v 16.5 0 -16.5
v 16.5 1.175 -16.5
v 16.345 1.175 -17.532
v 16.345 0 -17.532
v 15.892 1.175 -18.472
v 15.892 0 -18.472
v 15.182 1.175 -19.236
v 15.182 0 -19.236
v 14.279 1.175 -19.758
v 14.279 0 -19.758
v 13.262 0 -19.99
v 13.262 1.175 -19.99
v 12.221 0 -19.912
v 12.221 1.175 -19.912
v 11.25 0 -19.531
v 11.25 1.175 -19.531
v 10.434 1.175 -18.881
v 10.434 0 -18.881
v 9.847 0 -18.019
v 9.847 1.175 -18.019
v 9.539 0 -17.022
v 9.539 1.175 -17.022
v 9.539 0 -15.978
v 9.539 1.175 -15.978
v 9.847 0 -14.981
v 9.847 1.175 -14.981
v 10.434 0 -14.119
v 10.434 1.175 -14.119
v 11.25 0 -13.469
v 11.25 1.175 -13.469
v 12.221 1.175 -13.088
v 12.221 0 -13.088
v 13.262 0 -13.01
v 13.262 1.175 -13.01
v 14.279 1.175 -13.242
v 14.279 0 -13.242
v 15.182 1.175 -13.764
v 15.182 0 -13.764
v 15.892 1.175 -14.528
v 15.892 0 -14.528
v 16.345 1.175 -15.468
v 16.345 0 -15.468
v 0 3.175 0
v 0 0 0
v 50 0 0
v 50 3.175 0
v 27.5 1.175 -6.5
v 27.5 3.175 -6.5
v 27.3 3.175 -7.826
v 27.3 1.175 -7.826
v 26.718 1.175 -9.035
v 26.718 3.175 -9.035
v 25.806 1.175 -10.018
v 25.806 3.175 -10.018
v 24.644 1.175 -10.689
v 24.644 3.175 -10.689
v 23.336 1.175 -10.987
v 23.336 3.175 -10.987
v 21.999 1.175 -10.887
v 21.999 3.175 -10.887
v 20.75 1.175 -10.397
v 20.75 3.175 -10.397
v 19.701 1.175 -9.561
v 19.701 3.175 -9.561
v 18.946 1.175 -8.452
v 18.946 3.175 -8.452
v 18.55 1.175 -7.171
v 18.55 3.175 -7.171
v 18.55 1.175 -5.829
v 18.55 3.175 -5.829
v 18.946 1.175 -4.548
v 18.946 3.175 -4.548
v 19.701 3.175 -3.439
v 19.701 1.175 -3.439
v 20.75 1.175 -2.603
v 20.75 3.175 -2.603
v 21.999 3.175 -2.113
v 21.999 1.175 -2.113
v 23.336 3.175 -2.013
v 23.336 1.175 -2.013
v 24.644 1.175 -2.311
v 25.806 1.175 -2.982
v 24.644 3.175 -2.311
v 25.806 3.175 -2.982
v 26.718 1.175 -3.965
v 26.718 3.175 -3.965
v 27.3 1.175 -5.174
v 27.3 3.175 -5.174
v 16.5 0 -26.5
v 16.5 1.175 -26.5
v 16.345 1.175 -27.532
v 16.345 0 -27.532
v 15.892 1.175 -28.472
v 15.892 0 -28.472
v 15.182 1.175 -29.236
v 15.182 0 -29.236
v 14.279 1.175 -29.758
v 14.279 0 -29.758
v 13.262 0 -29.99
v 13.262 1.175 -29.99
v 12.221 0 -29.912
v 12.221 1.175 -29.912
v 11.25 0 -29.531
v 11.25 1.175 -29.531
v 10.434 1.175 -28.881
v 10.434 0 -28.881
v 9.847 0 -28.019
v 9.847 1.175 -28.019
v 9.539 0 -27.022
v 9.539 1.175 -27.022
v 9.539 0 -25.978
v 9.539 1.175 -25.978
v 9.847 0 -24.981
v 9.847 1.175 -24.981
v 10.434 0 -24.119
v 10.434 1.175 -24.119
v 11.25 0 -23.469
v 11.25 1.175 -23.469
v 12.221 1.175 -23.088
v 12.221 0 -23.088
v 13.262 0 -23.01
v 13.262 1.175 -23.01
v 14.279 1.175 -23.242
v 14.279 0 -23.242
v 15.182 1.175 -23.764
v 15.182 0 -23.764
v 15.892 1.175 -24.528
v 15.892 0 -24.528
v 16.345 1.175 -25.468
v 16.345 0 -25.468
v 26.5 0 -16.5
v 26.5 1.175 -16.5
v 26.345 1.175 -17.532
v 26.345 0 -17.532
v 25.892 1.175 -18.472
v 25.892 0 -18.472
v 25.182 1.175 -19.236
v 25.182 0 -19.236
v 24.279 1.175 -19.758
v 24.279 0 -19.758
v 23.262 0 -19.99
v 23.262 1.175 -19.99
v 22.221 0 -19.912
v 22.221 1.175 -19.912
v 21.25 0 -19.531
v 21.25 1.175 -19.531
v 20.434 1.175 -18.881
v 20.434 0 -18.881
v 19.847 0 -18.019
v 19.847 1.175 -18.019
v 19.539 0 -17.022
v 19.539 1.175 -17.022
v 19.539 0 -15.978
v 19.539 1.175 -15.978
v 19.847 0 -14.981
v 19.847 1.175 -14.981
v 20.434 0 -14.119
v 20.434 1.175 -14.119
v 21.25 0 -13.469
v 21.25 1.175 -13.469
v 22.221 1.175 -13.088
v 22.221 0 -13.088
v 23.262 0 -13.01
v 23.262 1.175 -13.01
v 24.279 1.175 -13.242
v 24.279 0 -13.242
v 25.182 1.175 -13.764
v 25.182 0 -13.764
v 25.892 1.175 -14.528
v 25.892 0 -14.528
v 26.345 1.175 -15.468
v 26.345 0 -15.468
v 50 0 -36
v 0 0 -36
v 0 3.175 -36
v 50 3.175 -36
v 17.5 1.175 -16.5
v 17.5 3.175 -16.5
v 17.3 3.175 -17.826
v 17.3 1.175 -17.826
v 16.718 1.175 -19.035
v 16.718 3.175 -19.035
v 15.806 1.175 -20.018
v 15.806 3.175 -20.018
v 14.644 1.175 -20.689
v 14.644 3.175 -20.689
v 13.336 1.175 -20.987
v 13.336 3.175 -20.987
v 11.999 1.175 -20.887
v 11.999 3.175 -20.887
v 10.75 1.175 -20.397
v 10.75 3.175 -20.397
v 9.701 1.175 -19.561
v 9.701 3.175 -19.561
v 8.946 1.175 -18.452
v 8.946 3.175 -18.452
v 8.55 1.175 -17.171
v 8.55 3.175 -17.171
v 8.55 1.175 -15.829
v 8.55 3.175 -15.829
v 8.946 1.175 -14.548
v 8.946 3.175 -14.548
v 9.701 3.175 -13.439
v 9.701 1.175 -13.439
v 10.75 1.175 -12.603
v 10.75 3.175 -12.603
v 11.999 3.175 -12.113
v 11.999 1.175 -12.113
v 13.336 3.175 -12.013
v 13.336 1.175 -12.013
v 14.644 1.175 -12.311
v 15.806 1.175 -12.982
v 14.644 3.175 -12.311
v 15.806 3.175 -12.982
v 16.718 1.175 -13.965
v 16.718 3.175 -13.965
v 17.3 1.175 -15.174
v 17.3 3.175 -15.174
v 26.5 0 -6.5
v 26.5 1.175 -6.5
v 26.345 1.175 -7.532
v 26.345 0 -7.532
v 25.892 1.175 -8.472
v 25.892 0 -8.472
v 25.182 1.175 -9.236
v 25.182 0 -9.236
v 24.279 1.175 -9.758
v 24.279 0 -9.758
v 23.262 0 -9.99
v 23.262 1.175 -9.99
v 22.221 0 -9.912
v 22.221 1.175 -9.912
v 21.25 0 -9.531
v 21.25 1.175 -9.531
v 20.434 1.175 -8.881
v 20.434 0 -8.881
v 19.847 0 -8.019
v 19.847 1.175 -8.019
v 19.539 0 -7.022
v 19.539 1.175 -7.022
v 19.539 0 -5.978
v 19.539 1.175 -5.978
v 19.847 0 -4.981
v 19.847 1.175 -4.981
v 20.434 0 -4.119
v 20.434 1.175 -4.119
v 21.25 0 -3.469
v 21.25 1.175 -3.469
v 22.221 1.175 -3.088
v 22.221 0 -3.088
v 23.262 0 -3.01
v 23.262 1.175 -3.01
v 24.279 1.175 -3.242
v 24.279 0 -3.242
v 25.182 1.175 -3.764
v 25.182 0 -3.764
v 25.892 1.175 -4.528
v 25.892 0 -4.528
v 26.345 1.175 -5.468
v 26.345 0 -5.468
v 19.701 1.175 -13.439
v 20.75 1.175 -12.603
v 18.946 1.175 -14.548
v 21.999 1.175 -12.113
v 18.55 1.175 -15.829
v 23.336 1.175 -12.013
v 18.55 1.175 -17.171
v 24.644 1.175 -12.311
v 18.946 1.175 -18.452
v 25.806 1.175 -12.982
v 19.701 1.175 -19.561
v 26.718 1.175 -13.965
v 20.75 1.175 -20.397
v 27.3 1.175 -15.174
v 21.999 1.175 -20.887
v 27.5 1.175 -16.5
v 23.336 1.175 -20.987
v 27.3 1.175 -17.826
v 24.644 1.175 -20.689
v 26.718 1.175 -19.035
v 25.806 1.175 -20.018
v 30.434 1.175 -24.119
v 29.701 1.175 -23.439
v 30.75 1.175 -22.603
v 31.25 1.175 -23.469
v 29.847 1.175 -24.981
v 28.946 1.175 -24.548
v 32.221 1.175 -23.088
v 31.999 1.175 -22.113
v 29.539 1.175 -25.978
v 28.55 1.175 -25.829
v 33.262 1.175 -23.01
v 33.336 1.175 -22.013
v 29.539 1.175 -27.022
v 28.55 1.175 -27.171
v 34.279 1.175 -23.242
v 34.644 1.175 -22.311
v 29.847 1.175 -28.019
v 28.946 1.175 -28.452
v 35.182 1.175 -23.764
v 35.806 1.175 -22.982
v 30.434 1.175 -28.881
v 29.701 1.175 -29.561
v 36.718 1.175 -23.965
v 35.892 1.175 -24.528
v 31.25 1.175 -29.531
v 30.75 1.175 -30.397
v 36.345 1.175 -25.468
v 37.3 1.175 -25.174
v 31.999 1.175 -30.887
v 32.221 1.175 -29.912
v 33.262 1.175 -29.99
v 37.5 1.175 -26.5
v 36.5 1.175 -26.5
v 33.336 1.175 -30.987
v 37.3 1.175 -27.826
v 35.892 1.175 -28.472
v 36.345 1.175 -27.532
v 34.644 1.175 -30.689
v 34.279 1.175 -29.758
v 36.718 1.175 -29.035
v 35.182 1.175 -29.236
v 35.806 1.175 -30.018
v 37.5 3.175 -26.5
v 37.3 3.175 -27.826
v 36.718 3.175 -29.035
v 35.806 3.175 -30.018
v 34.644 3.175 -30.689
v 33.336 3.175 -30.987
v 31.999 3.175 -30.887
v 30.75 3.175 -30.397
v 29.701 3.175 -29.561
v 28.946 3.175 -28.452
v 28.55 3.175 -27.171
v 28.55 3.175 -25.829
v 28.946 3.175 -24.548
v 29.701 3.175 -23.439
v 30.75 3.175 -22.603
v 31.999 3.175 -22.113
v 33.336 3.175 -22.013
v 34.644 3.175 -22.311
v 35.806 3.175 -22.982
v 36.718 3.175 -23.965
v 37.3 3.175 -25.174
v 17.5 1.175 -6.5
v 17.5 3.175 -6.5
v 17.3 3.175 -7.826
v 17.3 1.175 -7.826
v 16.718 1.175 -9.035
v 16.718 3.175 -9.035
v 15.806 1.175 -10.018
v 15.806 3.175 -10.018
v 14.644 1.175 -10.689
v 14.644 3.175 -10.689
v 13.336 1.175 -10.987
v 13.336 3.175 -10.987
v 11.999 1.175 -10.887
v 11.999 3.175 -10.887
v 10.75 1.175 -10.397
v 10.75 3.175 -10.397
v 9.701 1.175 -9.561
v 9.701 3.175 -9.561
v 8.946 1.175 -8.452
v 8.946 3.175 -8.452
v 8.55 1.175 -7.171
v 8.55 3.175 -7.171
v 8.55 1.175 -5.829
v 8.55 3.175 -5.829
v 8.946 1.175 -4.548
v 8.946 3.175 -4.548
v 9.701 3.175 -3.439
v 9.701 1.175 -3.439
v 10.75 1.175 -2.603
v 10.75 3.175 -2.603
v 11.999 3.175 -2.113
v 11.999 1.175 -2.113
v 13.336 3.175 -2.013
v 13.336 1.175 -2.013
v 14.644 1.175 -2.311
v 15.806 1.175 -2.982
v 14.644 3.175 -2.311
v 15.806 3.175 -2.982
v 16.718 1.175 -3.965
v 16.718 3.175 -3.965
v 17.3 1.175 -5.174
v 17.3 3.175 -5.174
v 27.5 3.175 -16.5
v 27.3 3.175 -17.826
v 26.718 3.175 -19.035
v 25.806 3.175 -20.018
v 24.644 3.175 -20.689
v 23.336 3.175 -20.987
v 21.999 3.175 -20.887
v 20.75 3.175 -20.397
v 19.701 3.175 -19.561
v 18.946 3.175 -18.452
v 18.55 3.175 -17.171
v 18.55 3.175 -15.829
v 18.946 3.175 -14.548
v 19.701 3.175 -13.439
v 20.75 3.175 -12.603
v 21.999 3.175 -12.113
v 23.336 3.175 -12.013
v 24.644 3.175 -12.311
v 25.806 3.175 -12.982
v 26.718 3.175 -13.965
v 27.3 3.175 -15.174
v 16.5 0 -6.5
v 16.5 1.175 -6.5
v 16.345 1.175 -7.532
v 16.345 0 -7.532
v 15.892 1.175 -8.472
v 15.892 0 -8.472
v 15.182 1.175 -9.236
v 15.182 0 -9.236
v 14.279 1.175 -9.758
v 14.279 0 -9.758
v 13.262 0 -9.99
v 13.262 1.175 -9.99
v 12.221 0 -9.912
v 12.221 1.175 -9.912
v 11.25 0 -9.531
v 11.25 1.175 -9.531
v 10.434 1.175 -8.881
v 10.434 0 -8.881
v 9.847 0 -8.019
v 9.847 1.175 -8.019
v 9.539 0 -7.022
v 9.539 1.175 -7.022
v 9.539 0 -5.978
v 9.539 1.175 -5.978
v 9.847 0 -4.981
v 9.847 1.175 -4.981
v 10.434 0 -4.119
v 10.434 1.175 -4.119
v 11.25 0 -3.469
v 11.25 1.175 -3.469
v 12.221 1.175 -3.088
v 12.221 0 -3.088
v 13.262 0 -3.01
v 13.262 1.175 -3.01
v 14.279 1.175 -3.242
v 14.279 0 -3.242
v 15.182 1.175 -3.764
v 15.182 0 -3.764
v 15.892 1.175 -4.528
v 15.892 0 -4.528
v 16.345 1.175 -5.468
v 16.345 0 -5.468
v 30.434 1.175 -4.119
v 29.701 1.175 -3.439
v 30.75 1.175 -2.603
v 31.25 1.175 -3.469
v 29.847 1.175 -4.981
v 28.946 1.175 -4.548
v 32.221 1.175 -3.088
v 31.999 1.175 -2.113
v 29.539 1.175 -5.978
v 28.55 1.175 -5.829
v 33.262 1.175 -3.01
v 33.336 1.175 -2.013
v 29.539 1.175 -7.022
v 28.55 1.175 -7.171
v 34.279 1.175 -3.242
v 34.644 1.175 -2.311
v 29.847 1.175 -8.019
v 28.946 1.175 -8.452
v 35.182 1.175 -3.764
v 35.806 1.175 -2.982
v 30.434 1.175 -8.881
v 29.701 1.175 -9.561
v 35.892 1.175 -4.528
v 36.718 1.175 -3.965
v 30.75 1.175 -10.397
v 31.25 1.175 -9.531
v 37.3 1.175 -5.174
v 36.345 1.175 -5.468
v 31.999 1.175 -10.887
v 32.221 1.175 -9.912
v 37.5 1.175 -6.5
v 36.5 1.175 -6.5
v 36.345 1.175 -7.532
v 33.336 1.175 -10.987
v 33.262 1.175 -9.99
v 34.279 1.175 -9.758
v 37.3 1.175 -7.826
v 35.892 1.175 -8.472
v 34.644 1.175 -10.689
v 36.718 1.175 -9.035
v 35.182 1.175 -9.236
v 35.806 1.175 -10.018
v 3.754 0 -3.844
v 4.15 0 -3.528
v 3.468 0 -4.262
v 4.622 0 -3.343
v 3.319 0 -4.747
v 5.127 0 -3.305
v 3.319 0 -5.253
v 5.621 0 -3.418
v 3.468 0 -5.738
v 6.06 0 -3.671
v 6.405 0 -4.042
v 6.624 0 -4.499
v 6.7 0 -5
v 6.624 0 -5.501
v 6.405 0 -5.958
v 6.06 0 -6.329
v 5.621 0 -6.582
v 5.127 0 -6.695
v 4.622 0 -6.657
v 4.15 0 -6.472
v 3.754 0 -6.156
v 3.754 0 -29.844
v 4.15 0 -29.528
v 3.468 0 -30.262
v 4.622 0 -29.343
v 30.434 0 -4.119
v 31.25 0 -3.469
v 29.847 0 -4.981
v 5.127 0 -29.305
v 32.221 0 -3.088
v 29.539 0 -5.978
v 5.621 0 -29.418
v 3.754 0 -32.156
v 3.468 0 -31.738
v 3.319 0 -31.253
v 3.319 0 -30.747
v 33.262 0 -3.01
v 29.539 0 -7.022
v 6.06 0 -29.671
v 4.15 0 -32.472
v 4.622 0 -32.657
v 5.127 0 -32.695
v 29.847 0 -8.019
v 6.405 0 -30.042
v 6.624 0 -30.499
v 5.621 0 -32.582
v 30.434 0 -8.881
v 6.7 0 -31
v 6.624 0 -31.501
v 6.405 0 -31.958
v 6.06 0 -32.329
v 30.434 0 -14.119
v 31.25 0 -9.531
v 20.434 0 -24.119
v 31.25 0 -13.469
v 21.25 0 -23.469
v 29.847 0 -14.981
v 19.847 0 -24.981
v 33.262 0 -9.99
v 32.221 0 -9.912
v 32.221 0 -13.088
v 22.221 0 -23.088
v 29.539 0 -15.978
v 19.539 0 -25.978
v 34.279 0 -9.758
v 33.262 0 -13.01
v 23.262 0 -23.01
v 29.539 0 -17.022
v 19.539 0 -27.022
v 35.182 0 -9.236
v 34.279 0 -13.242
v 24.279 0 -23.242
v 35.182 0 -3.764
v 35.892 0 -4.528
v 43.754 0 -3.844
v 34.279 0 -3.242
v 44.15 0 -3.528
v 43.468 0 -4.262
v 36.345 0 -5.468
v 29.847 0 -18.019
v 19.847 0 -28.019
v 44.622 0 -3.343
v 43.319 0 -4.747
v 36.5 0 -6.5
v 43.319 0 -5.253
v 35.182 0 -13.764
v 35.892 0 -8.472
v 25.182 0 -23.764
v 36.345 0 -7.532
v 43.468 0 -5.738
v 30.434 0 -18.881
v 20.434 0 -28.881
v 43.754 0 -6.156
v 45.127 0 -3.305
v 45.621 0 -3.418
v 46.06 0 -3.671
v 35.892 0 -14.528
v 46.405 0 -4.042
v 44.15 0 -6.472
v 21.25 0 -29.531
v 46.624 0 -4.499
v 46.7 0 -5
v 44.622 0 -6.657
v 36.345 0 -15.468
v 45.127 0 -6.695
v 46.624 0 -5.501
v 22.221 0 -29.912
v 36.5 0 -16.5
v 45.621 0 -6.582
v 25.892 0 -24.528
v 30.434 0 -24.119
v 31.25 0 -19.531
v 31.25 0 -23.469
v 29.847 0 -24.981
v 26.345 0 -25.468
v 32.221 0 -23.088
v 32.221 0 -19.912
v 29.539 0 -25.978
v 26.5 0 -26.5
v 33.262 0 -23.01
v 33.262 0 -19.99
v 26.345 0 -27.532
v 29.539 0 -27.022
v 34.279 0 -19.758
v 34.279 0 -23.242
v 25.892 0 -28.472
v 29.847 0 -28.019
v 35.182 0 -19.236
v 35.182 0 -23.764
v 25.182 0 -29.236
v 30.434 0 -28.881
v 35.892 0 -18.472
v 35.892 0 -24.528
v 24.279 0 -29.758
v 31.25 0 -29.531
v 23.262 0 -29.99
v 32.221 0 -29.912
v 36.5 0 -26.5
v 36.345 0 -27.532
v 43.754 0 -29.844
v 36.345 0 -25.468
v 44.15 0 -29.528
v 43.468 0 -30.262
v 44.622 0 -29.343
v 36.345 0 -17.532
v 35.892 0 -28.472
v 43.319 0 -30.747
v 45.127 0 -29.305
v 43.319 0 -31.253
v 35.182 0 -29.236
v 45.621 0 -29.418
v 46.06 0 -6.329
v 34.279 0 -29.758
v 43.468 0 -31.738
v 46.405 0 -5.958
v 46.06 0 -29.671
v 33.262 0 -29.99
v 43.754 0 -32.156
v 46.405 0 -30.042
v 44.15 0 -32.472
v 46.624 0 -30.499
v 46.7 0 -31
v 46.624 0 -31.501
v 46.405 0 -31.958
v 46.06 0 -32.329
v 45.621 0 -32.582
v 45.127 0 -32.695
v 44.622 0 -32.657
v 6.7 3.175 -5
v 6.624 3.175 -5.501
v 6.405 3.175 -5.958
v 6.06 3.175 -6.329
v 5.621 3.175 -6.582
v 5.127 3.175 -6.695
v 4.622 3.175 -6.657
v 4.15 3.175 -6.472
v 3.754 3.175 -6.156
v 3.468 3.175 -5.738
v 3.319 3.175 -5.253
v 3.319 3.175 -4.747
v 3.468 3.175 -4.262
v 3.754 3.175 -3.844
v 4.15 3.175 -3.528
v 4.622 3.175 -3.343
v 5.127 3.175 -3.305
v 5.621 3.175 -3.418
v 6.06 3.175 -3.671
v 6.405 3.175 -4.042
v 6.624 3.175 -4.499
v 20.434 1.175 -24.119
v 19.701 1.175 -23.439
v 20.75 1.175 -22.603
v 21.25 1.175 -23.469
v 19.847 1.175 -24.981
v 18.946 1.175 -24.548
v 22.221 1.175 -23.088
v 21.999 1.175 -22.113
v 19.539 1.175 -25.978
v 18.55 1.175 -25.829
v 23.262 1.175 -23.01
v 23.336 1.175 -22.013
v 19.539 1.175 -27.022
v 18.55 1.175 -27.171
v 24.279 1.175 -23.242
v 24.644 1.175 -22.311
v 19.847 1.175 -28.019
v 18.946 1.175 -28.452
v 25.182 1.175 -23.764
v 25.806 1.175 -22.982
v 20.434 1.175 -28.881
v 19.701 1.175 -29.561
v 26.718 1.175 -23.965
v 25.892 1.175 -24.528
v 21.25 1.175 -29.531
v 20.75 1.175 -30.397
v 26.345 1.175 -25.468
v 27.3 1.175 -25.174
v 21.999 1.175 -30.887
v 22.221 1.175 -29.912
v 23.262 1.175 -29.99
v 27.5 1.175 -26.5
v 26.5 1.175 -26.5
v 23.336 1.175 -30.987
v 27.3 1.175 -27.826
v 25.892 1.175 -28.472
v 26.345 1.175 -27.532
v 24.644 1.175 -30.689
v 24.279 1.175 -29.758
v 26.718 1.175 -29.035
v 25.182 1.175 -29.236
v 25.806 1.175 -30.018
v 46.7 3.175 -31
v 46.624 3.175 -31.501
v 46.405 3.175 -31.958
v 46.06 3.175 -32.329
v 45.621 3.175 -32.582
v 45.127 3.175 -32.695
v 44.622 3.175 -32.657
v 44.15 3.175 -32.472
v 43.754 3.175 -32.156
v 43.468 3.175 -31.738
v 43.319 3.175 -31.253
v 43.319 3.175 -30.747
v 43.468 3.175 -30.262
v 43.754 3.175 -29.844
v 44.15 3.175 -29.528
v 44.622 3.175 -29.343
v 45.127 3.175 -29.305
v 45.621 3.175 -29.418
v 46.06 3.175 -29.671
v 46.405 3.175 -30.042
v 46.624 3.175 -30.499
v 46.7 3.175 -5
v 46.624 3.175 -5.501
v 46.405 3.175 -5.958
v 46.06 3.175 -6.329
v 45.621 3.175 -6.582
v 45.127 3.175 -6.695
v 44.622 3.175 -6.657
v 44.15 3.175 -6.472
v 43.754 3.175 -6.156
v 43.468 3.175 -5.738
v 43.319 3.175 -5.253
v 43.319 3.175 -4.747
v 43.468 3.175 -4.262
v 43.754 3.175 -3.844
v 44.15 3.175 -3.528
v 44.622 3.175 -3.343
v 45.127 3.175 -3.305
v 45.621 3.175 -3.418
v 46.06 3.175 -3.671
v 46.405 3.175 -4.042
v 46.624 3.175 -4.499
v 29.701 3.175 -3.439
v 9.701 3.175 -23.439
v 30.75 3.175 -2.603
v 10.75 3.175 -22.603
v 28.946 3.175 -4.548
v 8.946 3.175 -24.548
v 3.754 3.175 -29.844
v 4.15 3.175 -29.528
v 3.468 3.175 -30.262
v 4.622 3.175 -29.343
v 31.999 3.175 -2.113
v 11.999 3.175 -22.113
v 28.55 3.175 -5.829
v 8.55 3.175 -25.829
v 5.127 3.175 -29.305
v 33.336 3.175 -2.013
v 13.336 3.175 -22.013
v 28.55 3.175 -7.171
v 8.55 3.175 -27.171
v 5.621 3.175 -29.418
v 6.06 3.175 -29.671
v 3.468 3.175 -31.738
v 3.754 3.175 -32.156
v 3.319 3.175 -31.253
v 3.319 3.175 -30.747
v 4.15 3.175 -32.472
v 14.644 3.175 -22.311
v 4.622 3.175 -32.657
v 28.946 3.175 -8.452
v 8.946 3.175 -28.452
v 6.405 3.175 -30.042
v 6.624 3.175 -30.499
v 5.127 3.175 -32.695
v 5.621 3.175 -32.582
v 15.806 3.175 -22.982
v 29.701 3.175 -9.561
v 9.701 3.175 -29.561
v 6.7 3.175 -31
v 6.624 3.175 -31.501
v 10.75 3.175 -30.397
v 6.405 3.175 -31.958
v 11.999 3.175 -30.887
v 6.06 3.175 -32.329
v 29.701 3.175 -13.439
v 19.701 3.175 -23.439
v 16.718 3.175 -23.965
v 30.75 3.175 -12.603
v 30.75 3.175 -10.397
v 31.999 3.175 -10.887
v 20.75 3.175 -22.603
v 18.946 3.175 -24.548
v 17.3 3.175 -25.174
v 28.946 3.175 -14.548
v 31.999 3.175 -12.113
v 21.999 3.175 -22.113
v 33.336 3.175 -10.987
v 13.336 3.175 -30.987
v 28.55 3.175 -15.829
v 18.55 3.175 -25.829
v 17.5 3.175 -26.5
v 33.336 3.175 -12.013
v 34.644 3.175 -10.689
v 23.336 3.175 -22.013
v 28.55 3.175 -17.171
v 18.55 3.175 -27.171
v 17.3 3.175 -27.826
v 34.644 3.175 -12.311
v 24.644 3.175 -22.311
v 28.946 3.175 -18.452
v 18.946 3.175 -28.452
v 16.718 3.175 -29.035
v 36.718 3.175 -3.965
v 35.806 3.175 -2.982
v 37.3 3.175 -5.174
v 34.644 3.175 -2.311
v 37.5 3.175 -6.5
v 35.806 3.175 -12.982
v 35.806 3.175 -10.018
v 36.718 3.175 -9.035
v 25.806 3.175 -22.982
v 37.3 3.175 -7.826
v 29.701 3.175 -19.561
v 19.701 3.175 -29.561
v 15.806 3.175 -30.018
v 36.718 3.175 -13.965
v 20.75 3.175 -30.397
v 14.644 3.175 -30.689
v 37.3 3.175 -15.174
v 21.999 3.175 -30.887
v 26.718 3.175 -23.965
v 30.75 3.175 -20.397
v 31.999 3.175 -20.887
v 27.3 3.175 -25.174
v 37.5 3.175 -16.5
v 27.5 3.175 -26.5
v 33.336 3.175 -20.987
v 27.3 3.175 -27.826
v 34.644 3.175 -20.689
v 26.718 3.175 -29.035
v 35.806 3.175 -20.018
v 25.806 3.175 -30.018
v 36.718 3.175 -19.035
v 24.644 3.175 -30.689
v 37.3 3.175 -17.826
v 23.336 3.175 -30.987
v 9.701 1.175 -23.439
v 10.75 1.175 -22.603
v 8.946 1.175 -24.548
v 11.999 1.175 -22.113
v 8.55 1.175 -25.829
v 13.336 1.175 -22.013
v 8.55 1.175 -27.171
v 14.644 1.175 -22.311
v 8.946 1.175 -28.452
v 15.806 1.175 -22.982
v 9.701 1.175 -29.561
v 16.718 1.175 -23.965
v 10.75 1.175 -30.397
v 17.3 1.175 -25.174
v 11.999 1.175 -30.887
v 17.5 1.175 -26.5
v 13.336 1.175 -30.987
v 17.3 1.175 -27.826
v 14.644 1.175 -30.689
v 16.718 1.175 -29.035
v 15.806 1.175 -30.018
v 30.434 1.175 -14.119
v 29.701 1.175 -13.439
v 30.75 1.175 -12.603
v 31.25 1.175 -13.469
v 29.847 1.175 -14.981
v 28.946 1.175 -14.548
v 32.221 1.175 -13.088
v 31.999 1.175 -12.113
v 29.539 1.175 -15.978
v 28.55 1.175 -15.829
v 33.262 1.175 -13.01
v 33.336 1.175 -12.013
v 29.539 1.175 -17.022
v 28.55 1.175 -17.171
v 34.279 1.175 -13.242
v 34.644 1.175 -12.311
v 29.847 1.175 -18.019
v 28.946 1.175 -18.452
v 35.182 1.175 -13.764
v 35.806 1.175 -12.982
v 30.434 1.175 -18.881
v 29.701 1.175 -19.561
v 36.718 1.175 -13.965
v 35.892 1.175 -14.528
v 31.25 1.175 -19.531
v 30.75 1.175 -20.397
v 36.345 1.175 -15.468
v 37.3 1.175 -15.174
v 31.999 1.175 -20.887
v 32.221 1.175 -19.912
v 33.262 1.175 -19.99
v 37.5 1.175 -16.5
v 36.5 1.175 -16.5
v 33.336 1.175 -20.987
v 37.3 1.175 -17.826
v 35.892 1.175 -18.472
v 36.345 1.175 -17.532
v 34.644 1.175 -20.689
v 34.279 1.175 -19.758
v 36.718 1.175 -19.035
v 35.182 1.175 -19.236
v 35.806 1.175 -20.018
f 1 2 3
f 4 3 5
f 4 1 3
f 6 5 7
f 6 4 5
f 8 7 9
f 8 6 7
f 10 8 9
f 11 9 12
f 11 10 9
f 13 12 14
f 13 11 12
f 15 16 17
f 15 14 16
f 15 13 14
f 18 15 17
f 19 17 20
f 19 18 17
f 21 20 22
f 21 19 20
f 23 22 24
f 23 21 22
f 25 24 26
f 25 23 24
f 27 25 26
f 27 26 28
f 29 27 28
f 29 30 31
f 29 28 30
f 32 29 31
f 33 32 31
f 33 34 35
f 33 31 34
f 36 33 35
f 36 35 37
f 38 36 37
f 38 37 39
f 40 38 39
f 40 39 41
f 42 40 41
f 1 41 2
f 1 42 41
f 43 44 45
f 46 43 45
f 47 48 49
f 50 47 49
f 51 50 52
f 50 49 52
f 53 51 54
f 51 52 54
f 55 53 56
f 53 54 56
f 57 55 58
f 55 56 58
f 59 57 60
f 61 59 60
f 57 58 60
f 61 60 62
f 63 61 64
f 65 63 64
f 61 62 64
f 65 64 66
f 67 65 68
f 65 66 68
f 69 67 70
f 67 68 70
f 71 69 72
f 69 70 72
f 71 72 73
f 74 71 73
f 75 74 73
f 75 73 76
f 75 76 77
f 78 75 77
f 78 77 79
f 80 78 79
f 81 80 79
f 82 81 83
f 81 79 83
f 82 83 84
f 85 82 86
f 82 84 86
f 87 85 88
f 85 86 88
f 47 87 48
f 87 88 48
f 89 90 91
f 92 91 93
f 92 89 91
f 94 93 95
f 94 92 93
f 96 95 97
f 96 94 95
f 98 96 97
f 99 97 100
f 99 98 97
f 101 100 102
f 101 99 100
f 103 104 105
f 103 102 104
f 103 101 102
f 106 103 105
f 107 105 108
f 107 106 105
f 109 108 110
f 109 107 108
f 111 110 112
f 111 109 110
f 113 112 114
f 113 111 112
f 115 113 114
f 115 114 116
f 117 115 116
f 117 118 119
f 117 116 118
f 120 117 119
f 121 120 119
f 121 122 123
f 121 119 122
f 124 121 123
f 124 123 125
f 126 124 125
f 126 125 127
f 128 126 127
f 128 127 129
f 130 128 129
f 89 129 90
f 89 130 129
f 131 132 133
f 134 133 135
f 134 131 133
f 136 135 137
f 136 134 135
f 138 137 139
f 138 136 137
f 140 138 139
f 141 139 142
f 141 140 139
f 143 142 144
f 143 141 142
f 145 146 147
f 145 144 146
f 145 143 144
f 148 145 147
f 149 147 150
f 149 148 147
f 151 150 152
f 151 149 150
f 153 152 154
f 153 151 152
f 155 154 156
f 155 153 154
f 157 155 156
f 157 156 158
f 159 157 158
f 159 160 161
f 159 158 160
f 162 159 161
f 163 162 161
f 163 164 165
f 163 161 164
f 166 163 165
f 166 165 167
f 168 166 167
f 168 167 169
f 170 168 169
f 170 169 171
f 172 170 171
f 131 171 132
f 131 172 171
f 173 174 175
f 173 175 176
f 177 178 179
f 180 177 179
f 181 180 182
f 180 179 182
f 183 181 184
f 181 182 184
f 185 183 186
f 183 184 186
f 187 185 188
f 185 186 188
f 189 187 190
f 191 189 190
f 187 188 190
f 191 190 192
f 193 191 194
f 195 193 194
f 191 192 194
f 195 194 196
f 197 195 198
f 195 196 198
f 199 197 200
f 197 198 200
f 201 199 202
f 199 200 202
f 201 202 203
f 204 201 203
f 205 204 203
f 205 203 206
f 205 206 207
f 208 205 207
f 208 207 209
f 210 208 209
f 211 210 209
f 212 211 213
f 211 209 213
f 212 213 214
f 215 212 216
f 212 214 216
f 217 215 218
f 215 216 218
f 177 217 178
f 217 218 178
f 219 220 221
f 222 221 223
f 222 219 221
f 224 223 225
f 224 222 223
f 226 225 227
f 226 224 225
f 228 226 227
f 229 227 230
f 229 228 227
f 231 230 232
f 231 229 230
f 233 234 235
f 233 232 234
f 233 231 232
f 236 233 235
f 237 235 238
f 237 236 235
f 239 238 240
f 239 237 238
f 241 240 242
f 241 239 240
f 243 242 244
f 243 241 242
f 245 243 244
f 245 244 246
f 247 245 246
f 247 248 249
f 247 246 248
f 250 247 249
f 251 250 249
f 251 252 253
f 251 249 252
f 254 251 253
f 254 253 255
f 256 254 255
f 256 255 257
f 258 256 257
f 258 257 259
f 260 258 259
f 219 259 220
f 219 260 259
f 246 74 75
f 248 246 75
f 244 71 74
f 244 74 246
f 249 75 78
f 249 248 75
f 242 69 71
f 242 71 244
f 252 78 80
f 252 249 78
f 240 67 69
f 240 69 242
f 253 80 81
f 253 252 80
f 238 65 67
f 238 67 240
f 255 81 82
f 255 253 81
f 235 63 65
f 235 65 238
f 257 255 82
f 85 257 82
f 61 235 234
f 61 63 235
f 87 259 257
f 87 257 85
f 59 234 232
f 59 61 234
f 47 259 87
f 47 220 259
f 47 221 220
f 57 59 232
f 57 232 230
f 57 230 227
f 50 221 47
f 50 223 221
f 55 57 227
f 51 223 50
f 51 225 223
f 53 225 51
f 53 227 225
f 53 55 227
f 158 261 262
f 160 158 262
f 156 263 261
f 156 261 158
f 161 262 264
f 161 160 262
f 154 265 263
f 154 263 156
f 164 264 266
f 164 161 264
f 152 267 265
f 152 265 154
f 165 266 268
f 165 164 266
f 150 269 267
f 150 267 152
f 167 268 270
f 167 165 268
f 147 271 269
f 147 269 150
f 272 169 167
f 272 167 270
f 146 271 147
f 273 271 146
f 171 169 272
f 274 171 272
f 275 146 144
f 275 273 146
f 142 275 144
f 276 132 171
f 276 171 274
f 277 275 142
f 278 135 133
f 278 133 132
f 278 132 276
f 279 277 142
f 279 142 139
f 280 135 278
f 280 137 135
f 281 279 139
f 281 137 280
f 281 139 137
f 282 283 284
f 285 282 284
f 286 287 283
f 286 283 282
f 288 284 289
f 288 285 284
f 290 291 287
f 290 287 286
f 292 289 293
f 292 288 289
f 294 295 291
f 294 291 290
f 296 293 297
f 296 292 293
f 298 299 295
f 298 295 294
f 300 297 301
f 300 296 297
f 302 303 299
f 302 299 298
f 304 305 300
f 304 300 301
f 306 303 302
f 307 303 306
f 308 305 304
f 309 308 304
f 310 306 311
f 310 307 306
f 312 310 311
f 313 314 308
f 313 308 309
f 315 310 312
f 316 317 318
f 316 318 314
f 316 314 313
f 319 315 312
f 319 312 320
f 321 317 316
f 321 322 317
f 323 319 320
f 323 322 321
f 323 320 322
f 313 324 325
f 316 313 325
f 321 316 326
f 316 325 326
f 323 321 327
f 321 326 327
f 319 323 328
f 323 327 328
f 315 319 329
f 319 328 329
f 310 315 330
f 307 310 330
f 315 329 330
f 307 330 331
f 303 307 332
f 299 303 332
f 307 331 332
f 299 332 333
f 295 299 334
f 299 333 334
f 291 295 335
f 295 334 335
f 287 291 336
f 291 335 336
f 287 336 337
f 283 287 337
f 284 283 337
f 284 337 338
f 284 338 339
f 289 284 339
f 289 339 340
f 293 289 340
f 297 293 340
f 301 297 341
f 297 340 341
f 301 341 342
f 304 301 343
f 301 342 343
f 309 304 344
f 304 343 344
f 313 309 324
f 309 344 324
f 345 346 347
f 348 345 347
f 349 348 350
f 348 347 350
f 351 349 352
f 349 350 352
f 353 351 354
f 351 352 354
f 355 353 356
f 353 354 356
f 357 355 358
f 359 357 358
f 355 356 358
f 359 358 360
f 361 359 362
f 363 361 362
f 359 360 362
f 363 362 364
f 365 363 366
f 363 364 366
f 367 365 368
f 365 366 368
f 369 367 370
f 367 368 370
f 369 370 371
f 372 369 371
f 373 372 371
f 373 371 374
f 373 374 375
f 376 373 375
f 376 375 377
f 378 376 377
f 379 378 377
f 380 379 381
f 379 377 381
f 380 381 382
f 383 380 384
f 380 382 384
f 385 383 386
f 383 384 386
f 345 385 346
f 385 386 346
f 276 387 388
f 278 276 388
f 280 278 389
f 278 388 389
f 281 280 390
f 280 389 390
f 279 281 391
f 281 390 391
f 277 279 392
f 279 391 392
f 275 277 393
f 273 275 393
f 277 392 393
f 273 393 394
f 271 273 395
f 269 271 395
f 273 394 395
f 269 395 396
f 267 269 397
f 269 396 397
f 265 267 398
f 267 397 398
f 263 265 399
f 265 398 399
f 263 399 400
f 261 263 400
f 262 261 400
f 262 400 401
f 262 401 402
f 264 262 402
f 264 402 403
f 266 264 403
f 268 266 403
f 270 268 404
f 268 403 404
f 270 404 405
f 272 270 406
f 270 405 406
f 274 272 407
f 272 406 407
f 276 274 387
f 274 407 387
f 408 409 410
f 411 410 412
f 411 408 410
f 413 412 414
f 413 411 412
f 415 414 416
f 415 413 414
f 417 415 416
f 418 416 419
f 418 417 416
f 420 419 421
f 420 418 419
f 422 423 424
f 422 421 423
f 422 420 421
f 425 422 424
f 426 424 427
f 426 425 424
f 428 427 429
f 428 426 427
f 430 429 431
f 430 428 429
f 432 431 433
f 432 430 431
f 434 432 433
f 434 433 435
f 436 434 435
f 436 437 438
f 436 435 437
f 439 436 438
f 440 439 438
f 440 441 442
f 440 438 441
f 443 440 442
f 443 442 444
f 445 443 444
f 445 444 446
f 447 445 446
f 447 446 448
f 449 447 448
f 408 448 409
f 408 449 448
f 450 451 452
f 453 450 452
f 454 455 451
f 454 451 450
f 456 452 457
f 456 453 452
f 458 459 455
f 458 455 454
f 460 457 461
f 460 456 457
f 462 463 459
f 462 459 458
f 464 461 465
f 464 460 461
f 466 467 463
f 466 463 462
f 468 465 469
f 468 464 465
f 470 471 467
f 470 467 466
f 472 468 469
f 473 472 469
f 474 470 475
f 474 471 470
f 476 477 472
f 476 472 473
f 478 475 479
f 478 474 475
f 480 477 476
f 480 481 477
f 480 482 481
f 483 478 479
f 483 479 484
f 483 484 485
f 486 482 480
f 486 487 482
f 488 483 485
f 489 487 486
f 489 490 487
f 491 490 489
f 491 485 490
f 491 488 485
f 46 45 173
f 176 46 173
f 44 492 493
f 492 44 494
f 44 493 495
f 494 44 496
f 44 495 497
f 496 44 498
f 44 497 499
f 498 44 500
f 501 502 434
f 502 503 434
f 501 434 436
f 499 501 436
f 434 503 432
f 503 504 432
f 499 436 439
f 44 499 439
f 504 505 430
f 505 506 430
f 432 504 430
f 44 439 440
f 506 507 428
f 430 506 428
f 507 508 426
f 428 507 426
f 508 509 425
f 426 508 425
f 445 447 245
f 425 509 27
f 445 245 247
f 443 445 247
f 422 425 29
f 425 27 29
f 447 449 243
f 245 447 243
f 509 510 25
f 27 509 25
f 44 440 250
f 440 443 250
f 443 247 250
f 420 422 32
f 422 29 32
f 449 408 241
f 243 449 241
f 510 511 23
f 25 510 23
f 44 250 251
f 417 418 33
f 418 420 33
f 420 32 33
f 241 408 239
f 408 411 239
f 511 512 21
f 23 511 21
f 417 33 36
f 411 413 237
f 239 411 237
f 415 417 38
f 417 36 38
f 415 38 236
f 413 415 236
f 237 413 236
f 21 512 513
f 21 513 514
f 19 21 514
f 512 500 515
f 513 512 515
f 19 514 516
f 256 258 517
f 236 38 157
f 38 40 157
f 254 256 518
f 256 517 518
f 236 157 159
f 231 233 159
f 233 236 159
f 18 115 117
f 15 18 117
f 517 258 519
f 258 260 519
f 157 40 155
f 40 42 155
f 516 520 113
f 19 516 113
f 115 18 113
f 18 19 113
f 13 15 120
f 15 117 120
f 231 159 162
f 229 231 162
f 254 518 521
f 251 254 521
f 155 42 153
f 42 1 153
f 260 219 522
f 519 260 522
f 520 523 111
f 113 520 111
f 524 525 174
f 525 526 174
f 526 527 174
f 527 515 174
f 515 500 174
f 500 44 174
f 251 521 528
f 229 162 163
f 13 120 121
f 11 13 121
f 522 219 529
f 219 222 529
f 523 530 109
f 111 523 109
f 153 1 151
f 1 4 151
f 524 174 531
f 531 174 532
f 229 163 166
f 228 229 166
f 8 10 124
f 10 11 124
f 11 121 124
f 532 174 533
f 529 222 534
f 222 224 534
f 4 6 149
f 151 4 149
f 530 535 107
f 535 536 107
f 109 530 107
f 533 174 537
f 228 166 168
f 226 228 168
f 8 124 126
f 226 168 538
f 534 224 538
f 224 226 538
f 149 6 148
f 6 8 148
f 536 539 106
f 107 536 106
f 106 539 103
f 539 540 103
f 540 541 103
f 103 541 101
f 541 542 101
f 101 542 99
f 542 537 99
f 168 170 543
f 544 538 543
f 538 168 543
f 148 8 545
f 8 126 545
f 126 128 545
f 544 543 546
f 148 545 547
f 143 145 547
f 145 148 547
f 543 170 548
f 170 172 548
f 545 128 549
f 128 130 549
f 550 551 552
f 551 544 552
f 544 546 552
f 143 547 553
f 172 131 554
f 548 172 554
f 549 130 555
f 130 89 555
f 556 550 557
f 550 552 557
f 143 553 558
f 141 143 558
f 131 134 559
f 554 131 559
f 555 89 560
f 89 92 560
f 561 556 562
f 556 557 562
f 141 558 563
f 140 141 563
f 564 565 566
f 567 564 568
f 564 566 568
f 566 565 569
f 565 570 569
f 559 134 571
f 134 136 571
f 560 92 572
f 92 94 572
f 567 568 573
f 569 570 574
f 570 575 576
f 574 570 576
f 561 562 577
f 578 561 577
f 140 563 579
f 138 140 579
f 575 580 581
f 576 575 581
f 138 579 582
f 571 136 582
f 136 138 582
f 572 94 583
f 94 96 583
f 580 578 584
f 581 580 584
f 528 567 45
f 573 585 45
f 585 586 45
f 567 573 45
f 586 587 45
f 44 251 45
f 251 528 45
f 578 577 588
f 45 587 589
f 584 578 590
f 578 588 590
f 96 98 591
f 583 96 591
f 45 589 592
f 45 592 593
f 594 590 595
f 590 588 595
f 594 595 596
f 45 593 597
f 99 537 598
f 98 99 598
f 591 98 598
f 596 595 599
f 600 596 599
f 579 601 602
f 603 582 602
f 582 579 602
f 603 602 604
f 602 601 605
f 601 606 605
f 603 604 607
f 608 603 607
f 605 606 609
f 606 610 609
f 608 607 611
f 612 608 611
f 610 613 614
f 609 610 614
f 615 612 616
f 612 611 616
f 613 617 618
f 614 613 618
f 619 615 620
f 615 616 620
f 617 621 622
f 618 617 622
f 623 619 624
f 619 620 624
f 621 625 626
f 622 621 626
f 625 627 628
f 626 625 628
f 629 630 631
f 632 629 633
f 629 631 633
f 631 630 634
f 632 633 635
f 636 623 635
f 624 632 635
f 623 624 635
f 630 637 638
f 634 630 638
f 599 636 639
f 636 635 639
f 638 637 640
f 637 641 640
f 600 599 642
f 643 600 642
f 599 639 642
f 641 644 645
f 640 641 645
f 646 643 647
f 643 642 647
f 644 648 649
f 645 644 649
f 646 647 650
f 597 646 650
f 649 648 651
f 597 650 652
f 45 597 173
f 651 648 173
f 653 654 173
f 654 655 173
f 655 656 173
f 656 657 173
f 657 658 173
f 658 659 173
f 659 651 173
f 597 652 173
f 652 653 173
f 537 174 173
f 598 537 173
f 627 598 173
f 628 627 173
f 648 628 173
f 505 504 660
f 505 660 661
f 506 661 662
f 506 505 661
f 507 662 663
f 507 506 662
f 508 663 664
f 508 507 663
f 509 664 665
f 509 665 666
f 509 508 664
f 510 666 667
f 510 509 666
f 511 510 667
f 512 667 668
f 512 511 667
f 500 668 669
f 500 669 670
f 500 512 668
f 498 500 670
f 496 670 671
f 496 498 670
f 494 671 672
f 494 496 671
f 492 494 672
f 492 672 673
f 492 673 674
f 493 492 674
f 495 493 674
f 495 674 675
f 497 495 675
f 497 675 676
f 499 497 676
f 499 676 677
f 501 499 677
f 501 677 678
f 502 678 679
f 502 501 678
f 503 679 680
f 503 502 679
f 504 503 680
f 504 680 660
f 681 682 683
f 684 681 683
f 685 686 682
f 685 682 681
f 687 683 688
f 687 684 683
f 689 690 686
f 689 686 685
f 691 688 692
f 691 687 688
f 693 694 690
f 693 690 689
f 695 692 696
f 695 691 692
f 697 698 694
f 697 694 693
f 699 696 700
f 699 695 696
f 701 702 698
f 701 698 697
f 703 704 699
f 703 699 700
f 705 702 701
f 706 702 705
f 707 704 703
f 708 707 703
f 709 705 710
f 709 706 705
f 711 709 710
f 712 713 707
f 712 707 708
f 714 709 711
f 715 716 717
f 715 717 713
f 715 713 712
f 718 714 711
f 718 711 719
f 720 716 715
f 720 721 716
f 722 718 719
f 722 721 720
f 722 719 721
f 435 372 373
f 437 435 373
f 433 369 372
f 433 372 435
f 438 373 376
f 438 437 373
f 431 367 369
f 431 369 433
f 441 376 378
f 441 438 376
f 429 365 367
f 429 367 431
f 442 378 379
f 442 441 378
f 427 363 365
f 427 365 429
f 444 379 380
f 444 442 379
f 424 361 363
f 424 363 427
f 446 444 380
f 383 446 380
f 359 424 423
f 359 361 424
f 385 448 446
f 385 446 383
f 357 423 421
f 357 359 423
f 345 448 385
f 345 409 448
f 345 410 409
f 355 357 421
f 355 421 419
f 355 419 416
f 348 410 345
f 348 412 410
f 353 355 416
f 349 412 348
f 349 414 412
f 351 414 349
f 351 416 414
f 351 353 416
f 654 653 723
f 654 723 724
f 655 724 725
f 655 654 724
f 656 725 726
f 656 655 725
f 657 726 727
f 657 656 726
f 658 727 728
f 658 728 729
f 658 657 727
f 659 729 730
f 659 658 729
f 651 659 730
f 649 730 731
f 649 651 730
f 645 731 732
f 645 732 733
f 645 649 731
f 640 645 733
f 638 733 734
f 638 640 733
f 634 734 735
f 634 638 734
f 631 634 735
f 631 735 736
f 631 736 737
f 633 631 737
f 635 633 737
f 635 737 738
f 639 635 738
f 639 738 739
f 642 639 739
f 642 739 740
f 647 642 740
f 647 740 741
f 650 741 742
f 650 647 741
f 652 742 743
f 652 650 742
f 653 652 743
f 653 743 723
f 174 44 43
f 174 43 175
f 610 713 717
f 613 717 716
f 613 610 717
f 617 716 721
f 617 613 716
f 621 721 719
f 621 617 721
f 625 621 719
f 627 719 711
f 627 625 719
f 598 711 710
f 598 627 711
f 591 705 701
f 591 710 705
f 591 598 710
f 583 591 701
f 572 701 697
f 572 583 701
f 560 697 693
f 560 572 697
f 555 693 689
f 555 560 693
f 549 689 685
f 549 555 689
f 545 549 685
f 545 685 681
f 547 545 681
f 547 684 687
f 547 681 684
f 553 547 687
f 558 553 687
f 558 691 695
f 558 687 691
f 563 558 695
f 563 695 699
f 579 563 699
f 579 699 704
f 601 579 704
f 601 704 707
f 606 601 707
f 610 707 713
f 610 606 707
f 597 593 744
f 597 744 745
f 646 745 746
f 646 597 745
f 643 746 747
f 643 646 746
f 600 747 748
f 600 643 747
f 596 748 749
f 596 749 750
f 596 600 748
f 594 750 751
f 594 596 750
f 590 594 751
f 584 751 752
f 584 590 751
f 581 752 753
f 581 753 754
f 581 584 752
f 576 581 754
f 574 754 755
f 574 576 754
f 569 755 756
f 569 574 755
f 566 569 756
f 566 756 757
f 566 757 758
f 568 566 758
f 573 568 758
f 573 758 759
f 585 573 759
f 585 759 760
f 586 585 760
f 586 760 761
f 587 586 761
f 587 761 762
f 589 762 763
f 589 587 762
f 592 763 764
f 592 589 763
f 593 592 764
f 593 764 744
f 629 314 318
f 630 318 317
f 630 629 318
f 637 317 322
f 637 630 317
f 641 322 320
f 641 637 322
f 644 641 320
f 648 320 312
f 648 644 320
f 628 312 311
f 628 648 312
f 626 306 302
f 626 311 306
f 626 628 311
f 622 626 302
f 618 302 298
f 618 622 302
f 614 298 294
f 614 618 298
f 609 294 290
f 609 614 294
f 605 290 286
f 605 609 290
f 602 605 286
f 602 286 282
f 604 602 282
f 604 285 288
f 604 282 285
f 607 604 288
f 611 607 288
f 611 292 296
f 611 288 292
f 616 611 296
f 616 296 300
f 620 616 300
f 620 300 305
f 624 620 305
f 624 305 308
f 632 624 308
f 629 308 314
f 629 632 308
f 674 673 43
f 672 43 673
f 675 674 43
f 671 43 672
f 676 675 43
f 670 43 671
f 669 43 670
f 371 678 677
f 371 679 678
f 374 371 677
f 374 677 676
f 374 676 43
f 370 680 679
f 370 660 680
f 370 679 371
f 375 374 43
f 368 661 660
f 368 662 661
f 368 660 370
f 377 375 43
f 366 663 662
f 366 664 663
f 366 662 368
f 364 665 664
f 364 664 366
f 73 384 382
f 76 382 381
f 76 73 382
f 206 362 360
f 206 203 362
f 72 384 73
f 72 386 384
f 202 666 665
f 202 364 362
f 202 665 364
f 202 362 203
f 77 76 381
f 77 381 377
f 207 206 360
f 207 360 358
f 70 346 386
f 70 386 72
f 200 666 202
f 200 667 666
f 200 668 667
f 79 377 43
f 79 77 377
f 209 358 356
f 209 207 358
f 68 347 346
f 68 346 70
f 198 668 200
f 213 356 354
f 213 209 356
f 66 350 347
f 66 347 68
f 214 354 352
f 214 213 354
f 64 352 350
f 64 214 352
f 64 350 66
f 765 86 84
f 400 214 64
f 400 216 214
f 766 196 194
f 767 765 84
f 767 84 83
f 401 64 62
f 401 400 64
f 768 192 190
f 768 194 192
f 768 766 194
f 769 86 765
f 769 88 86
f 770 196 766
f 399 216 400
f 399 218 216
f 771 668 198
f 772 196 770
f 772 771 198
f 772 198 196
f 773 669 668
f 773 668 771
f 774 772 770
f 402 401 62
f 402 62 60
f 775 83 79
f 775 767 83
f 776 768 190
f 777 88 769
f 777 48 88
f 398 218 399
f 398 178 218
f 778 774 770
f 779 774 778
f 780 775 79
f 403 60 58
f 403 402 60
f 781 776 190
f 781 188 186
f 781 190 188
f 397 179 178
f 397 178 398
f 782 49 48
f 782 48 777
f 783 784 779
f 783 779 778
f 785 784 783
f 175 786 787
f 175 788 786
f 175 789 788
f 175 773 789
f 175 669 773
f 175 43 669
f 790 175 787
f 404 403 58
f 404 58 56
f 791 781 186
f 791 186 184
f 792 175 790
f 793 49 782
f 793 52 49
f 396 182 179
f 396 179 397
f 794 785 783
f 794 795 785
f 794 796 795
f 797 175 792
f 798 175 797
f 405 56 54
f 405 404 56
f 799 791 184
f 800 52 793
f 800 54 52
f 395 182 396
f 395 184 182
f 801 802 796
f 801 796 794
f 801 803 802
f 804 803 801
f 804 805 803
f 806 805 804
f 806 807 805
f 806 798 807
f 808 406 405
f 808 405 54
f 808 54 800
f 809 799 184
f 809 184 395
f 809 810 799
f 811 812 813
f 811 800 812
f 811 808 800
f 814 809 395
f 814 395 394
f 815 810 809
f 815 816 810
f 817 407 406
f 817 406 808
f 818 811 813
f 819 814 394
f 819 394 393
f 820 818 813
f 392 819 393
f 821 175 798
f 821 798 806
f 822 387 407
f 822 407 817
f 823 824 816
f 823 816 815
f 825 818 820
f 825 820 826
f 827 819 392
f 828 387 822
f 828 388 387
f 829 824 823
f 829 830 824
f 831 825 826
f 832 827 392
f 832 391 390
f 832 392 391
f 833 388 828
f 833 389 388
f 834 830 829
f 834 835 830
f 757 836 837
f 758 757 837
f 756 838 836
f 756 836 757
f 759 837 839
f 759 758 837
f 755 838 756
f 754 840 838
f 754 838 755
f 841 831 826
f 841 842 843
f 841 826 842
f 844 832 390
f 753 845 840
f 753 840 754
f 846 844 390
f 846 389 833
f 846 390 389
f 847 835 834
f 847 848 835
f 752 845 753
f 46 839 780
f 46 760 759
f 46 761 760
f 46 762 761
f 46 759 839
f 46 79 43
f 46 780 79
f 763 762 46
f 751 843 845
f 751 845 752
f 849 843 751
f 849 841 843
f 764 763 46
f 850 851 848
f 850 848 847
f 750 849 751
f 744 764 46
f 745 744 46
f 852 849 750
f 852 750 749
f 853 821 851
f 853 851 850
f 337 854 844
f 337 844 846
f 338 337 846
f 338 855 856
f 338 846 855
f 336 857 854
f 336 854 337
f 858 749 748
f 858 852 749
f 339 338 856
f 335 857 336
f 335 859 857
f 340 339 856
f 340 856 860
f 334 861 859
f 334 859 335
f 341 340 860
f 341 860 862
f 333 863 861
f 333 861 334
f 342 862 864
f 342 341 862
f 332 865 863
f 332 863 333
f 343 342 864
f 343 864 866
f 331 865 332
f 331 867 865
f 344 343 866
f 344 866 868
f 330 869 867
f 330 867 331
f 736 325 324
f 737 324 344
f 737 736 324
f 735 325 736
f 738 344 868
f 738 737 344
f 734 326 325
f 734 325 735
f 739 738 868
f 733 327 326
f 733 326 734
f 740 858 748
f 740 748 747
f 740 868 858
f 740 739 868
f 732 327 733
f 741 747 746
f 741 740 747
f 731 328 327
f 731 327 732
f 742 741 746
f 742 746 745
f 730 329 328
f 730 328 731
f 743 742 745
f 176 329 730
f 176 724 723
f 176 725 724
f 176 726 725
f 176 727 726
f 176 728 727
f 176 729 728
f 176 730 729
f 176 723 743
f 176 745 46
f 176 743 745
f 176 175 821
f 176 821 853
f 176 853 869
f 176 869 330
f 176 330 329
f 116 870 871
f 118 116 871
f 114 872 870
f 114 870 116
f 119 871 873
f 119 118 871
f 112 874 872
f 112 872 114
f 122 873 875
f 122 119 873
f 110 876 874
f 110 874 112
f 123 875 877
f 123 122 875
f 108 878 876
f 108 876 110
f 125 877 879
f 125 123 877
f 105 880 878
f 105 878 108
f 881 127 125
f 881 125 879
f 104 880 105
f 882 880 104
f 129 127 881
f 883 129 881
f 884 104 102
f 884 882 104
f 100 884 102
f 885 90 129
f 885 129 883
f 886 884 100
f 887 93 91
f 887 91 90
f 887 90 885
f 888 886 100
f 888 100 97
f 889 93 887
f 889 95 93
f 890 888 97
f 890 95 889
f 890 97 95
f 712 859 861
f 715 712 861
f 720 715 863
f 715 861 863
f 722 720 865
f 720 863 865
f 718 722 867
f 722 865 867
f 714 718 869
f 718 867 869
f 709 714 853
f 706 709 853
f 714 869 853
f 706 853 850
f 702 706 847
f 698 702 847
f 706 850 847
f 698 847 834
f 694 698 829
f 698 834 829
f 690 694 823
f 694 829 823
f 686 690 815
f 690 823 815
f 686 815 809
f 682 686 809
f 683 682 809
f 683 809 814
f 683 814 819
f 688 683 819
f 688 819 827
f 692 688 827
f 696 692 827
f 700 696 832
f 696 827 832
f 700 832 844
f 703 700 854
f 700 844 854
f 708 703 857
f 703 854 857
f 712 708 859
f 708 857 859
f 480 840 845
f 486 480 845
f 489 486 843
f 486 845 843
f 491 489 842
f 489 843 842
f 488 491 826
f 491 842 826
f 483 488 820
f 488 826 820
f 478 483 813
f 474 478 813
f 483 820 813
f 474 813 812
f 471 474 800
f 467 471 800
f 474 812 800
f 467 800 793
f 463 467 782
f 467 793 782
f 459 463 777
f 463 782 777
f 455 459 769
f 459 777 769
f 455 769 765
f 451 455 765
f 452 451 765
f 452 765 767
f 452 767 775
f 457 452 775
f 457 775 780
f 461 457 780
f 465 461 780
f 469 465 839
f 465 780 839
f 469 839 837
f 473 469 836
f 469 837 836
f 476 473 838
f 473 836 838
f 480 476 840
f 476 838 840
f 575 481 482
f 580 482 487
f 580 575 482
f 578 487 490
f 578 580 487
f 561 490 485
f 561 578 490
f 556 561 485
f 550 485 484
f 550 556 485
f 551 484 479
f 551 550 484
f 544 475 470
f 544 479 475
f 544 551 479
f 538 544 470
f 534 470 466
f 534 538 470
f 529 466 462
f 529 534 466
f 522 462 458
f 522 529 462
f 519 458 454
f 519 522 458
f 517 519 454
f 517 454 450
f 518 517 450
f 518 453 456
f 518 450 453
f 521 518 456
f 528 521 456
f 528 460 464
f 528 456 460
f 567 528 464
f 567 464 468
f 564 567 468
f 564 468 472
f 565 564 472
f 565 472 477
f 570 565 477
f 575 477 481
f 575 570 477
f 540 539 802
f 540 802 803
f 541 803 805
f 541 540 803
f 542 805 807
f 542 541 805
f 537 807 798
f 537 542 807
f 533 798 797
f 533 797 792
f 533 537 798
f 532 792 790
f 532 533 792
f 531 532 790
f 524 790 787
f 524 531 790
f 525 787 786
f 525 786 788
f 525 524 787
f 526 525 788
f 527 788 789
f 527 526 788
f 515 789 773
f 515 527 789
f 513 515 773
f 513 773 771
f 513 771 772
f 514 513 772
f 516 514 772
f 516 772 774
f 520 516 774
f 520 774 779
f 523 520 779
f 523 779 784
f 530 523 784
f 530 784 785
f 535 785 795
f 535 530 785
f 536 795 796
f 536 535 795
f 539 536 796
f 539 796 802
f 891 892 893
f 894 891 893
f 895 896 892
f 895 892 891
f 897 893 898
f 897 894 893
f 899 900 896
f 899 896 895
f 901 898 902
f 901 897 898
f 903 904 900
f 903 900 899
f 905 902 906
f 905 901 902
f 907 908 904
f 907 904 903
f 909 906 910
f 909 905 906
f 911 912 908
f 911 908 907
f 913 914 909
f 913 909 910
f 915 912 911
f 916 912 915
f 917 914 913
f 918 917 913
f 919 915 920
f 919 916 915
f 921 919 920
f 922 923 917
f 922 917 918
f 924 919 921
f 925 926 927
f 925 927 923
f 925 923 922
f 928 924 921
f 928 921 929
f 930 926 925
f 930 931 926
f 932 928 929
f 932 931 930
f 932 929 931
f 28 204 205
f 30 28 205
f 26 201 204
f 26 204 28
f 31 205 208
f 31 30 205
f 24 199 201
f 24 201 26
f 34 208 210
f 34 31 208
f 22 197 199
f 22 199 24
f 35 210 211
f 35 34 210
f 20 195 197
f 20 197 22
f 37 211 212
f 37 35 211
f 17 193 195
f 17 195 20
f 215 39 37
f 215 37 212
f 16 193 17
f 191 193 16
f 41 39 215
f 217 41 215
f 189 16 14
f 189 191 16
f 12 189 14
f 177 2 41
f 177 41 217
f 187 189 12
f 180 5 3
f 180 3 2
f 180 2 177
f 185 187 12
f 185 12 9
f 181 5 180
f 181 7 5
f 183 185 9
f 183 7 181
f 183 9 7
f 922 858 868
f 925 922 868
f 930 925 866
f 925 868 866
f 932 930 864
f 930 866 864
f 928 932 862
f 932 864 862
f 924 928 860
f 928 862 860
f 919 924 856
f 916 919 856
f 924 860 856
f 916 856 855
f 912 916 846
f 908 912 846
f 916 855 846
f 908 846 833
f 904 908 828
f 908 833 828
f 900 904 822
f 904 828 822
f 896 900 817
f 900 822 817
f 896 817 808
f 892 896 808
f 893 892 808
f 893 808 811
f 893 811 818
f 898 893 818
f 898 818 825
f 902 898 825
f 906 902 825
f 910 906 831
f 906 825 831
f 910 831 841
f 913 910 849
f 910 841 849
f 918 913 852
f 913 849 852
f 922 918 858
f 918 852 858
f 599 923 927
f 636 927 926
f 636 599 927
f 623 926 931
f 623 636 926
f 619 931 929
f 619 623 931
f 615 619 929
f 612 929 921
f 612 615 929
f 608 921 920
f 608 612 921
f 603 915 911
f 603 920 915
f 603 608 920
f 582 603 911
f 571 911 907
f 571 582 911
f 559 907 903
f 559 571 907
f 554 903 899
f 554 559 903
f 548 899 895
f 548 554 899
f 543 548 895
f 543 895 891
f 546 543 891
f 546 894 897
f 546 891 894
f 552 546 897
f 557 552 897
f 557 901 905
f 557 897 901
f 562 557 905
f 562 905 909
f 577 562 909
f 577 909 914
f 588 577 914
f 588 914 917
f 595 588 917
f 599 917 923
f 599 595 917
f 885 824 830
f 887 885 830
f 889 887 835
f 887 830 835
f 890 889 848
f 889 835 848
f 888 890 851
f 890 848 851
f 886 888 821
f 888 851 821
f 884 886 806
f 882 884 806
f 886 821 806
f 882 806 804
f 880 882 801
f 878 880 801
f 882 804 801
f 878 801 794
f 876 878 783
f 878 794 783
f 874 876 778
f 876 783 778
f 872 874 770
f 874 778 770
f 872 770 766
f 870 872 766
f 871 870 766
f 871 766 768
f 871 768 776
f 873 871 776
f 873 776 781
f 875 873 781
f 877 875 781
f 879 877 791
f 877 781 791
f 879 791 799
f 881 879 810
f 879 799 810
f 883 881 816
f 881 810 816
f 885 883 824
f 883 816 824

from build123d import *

# Parameters (mm, degrees)
SKETCH1_W           = 50
SKETCH1_H           = 36
SKETCH1_R           = 3.5
SKETCH1_R_2         = 1.7
BOSS_EXTRUDE1_DEPTH = 3.175
SKETCH2_R           = 4.5
CUT_EXTRUDE1_DEPTH  = 2


with BuildPart() as part:
    # Sketch1 → Boss-Extrude1 (new body)
    with BuildSketch(Plane(origin=(0, 0, 0), x_dir=(1, 0, 0), z_dir=(0, 1, 0))):
        with Locations((25, 18)):
            Rectangle(SKETCH1_W, SKETCH1_H)
        with Locations((13, 6.5)):
            Circle(SKETCH1_R, mode=Mode.SUBTRACT)
        with Locations((5, 5)):
            Circle(SKETCH1_R_2, mode=Mode.SUBTRACT)
        with Locations((5, 31)):
            Circle(SKETCH1_R_2, mode=Mode.SUBTRACT)
        with Locations((45, 31)):
            Circle(SKETCH1_R_2, mode=Mode.SUBTRACT)
        with Locations((45, 5)):
            Circle(SKETCH1_R_2, mode=Mode.SUBTRACT)
        with Locations((23, 6.5)):
            Circle(SKETCH1_R, mode=Mode.SUBTRACT)
        with Locations((33, 6.5)):
            Circle(SKETCH1_R, mode=Mode.SUBTRACT)
        with Locations((23, 16.5)):
            Circle(SKETCH1_R, mode=Mode.SUBTRACT)
        with Locations((33, 16.5)):
            Circle(SKETCH1_R, mode=Mode.SUBTRACT)
        with Locations((23, 26.5)):
            Circle(SKETCH1_R, mode=Mode.SUBTRACT)
        with Locations((33, 26.5)):
            Circle(SKETCH1_R, mode=Mode.SUBTRACT)
        with Locations((13, 16.5)):
            Circle(SKETCH1_R, mode=Mode.SUBTRACT)
        with Locations((13, 26.5)):
            Circle(SKETCH1_R, mode=Mode.SUBTRACT)
    extrude(amount=BOSS_EXTRUDE1_DEPTH)

    # Sketch2 → Cut-Extrude1 (cut)
    with BuildSketch(Plane(origin=(0, 3.175, 0), x_dir=(1, 0, 0), z_dir=(0, 1, 0))):
        with Locations((13, 26.5)):
            Circle(SKETCH2_R)
        with Locations((23, 26.5)):
            Circle(SKETCH2_R)
        with Locations((33, 26.5)):
            Circle(SKETCH2_R)
        with Locations((23, 16.5)):
            Circle(SKETCH2_R)
        with Locations((33, 16.5)):
            Circle(SKETCH2_R)
        with Locations((23, 6.5)):
            Circle(SKETCH2_R)
        with Locations((33, 6.5)):
            Circle(SKETCH2_R)
        with Locations((13, 16.5)):
            Circle(SKETCH2_R)
        with Locations((13, 6.5)):
            Circle(SKETCH2_R)
    extrude(amount=-CUT_EXTRUDE1_DEPTH, mode=Mode.SUBTRACT)


solid = part.part
